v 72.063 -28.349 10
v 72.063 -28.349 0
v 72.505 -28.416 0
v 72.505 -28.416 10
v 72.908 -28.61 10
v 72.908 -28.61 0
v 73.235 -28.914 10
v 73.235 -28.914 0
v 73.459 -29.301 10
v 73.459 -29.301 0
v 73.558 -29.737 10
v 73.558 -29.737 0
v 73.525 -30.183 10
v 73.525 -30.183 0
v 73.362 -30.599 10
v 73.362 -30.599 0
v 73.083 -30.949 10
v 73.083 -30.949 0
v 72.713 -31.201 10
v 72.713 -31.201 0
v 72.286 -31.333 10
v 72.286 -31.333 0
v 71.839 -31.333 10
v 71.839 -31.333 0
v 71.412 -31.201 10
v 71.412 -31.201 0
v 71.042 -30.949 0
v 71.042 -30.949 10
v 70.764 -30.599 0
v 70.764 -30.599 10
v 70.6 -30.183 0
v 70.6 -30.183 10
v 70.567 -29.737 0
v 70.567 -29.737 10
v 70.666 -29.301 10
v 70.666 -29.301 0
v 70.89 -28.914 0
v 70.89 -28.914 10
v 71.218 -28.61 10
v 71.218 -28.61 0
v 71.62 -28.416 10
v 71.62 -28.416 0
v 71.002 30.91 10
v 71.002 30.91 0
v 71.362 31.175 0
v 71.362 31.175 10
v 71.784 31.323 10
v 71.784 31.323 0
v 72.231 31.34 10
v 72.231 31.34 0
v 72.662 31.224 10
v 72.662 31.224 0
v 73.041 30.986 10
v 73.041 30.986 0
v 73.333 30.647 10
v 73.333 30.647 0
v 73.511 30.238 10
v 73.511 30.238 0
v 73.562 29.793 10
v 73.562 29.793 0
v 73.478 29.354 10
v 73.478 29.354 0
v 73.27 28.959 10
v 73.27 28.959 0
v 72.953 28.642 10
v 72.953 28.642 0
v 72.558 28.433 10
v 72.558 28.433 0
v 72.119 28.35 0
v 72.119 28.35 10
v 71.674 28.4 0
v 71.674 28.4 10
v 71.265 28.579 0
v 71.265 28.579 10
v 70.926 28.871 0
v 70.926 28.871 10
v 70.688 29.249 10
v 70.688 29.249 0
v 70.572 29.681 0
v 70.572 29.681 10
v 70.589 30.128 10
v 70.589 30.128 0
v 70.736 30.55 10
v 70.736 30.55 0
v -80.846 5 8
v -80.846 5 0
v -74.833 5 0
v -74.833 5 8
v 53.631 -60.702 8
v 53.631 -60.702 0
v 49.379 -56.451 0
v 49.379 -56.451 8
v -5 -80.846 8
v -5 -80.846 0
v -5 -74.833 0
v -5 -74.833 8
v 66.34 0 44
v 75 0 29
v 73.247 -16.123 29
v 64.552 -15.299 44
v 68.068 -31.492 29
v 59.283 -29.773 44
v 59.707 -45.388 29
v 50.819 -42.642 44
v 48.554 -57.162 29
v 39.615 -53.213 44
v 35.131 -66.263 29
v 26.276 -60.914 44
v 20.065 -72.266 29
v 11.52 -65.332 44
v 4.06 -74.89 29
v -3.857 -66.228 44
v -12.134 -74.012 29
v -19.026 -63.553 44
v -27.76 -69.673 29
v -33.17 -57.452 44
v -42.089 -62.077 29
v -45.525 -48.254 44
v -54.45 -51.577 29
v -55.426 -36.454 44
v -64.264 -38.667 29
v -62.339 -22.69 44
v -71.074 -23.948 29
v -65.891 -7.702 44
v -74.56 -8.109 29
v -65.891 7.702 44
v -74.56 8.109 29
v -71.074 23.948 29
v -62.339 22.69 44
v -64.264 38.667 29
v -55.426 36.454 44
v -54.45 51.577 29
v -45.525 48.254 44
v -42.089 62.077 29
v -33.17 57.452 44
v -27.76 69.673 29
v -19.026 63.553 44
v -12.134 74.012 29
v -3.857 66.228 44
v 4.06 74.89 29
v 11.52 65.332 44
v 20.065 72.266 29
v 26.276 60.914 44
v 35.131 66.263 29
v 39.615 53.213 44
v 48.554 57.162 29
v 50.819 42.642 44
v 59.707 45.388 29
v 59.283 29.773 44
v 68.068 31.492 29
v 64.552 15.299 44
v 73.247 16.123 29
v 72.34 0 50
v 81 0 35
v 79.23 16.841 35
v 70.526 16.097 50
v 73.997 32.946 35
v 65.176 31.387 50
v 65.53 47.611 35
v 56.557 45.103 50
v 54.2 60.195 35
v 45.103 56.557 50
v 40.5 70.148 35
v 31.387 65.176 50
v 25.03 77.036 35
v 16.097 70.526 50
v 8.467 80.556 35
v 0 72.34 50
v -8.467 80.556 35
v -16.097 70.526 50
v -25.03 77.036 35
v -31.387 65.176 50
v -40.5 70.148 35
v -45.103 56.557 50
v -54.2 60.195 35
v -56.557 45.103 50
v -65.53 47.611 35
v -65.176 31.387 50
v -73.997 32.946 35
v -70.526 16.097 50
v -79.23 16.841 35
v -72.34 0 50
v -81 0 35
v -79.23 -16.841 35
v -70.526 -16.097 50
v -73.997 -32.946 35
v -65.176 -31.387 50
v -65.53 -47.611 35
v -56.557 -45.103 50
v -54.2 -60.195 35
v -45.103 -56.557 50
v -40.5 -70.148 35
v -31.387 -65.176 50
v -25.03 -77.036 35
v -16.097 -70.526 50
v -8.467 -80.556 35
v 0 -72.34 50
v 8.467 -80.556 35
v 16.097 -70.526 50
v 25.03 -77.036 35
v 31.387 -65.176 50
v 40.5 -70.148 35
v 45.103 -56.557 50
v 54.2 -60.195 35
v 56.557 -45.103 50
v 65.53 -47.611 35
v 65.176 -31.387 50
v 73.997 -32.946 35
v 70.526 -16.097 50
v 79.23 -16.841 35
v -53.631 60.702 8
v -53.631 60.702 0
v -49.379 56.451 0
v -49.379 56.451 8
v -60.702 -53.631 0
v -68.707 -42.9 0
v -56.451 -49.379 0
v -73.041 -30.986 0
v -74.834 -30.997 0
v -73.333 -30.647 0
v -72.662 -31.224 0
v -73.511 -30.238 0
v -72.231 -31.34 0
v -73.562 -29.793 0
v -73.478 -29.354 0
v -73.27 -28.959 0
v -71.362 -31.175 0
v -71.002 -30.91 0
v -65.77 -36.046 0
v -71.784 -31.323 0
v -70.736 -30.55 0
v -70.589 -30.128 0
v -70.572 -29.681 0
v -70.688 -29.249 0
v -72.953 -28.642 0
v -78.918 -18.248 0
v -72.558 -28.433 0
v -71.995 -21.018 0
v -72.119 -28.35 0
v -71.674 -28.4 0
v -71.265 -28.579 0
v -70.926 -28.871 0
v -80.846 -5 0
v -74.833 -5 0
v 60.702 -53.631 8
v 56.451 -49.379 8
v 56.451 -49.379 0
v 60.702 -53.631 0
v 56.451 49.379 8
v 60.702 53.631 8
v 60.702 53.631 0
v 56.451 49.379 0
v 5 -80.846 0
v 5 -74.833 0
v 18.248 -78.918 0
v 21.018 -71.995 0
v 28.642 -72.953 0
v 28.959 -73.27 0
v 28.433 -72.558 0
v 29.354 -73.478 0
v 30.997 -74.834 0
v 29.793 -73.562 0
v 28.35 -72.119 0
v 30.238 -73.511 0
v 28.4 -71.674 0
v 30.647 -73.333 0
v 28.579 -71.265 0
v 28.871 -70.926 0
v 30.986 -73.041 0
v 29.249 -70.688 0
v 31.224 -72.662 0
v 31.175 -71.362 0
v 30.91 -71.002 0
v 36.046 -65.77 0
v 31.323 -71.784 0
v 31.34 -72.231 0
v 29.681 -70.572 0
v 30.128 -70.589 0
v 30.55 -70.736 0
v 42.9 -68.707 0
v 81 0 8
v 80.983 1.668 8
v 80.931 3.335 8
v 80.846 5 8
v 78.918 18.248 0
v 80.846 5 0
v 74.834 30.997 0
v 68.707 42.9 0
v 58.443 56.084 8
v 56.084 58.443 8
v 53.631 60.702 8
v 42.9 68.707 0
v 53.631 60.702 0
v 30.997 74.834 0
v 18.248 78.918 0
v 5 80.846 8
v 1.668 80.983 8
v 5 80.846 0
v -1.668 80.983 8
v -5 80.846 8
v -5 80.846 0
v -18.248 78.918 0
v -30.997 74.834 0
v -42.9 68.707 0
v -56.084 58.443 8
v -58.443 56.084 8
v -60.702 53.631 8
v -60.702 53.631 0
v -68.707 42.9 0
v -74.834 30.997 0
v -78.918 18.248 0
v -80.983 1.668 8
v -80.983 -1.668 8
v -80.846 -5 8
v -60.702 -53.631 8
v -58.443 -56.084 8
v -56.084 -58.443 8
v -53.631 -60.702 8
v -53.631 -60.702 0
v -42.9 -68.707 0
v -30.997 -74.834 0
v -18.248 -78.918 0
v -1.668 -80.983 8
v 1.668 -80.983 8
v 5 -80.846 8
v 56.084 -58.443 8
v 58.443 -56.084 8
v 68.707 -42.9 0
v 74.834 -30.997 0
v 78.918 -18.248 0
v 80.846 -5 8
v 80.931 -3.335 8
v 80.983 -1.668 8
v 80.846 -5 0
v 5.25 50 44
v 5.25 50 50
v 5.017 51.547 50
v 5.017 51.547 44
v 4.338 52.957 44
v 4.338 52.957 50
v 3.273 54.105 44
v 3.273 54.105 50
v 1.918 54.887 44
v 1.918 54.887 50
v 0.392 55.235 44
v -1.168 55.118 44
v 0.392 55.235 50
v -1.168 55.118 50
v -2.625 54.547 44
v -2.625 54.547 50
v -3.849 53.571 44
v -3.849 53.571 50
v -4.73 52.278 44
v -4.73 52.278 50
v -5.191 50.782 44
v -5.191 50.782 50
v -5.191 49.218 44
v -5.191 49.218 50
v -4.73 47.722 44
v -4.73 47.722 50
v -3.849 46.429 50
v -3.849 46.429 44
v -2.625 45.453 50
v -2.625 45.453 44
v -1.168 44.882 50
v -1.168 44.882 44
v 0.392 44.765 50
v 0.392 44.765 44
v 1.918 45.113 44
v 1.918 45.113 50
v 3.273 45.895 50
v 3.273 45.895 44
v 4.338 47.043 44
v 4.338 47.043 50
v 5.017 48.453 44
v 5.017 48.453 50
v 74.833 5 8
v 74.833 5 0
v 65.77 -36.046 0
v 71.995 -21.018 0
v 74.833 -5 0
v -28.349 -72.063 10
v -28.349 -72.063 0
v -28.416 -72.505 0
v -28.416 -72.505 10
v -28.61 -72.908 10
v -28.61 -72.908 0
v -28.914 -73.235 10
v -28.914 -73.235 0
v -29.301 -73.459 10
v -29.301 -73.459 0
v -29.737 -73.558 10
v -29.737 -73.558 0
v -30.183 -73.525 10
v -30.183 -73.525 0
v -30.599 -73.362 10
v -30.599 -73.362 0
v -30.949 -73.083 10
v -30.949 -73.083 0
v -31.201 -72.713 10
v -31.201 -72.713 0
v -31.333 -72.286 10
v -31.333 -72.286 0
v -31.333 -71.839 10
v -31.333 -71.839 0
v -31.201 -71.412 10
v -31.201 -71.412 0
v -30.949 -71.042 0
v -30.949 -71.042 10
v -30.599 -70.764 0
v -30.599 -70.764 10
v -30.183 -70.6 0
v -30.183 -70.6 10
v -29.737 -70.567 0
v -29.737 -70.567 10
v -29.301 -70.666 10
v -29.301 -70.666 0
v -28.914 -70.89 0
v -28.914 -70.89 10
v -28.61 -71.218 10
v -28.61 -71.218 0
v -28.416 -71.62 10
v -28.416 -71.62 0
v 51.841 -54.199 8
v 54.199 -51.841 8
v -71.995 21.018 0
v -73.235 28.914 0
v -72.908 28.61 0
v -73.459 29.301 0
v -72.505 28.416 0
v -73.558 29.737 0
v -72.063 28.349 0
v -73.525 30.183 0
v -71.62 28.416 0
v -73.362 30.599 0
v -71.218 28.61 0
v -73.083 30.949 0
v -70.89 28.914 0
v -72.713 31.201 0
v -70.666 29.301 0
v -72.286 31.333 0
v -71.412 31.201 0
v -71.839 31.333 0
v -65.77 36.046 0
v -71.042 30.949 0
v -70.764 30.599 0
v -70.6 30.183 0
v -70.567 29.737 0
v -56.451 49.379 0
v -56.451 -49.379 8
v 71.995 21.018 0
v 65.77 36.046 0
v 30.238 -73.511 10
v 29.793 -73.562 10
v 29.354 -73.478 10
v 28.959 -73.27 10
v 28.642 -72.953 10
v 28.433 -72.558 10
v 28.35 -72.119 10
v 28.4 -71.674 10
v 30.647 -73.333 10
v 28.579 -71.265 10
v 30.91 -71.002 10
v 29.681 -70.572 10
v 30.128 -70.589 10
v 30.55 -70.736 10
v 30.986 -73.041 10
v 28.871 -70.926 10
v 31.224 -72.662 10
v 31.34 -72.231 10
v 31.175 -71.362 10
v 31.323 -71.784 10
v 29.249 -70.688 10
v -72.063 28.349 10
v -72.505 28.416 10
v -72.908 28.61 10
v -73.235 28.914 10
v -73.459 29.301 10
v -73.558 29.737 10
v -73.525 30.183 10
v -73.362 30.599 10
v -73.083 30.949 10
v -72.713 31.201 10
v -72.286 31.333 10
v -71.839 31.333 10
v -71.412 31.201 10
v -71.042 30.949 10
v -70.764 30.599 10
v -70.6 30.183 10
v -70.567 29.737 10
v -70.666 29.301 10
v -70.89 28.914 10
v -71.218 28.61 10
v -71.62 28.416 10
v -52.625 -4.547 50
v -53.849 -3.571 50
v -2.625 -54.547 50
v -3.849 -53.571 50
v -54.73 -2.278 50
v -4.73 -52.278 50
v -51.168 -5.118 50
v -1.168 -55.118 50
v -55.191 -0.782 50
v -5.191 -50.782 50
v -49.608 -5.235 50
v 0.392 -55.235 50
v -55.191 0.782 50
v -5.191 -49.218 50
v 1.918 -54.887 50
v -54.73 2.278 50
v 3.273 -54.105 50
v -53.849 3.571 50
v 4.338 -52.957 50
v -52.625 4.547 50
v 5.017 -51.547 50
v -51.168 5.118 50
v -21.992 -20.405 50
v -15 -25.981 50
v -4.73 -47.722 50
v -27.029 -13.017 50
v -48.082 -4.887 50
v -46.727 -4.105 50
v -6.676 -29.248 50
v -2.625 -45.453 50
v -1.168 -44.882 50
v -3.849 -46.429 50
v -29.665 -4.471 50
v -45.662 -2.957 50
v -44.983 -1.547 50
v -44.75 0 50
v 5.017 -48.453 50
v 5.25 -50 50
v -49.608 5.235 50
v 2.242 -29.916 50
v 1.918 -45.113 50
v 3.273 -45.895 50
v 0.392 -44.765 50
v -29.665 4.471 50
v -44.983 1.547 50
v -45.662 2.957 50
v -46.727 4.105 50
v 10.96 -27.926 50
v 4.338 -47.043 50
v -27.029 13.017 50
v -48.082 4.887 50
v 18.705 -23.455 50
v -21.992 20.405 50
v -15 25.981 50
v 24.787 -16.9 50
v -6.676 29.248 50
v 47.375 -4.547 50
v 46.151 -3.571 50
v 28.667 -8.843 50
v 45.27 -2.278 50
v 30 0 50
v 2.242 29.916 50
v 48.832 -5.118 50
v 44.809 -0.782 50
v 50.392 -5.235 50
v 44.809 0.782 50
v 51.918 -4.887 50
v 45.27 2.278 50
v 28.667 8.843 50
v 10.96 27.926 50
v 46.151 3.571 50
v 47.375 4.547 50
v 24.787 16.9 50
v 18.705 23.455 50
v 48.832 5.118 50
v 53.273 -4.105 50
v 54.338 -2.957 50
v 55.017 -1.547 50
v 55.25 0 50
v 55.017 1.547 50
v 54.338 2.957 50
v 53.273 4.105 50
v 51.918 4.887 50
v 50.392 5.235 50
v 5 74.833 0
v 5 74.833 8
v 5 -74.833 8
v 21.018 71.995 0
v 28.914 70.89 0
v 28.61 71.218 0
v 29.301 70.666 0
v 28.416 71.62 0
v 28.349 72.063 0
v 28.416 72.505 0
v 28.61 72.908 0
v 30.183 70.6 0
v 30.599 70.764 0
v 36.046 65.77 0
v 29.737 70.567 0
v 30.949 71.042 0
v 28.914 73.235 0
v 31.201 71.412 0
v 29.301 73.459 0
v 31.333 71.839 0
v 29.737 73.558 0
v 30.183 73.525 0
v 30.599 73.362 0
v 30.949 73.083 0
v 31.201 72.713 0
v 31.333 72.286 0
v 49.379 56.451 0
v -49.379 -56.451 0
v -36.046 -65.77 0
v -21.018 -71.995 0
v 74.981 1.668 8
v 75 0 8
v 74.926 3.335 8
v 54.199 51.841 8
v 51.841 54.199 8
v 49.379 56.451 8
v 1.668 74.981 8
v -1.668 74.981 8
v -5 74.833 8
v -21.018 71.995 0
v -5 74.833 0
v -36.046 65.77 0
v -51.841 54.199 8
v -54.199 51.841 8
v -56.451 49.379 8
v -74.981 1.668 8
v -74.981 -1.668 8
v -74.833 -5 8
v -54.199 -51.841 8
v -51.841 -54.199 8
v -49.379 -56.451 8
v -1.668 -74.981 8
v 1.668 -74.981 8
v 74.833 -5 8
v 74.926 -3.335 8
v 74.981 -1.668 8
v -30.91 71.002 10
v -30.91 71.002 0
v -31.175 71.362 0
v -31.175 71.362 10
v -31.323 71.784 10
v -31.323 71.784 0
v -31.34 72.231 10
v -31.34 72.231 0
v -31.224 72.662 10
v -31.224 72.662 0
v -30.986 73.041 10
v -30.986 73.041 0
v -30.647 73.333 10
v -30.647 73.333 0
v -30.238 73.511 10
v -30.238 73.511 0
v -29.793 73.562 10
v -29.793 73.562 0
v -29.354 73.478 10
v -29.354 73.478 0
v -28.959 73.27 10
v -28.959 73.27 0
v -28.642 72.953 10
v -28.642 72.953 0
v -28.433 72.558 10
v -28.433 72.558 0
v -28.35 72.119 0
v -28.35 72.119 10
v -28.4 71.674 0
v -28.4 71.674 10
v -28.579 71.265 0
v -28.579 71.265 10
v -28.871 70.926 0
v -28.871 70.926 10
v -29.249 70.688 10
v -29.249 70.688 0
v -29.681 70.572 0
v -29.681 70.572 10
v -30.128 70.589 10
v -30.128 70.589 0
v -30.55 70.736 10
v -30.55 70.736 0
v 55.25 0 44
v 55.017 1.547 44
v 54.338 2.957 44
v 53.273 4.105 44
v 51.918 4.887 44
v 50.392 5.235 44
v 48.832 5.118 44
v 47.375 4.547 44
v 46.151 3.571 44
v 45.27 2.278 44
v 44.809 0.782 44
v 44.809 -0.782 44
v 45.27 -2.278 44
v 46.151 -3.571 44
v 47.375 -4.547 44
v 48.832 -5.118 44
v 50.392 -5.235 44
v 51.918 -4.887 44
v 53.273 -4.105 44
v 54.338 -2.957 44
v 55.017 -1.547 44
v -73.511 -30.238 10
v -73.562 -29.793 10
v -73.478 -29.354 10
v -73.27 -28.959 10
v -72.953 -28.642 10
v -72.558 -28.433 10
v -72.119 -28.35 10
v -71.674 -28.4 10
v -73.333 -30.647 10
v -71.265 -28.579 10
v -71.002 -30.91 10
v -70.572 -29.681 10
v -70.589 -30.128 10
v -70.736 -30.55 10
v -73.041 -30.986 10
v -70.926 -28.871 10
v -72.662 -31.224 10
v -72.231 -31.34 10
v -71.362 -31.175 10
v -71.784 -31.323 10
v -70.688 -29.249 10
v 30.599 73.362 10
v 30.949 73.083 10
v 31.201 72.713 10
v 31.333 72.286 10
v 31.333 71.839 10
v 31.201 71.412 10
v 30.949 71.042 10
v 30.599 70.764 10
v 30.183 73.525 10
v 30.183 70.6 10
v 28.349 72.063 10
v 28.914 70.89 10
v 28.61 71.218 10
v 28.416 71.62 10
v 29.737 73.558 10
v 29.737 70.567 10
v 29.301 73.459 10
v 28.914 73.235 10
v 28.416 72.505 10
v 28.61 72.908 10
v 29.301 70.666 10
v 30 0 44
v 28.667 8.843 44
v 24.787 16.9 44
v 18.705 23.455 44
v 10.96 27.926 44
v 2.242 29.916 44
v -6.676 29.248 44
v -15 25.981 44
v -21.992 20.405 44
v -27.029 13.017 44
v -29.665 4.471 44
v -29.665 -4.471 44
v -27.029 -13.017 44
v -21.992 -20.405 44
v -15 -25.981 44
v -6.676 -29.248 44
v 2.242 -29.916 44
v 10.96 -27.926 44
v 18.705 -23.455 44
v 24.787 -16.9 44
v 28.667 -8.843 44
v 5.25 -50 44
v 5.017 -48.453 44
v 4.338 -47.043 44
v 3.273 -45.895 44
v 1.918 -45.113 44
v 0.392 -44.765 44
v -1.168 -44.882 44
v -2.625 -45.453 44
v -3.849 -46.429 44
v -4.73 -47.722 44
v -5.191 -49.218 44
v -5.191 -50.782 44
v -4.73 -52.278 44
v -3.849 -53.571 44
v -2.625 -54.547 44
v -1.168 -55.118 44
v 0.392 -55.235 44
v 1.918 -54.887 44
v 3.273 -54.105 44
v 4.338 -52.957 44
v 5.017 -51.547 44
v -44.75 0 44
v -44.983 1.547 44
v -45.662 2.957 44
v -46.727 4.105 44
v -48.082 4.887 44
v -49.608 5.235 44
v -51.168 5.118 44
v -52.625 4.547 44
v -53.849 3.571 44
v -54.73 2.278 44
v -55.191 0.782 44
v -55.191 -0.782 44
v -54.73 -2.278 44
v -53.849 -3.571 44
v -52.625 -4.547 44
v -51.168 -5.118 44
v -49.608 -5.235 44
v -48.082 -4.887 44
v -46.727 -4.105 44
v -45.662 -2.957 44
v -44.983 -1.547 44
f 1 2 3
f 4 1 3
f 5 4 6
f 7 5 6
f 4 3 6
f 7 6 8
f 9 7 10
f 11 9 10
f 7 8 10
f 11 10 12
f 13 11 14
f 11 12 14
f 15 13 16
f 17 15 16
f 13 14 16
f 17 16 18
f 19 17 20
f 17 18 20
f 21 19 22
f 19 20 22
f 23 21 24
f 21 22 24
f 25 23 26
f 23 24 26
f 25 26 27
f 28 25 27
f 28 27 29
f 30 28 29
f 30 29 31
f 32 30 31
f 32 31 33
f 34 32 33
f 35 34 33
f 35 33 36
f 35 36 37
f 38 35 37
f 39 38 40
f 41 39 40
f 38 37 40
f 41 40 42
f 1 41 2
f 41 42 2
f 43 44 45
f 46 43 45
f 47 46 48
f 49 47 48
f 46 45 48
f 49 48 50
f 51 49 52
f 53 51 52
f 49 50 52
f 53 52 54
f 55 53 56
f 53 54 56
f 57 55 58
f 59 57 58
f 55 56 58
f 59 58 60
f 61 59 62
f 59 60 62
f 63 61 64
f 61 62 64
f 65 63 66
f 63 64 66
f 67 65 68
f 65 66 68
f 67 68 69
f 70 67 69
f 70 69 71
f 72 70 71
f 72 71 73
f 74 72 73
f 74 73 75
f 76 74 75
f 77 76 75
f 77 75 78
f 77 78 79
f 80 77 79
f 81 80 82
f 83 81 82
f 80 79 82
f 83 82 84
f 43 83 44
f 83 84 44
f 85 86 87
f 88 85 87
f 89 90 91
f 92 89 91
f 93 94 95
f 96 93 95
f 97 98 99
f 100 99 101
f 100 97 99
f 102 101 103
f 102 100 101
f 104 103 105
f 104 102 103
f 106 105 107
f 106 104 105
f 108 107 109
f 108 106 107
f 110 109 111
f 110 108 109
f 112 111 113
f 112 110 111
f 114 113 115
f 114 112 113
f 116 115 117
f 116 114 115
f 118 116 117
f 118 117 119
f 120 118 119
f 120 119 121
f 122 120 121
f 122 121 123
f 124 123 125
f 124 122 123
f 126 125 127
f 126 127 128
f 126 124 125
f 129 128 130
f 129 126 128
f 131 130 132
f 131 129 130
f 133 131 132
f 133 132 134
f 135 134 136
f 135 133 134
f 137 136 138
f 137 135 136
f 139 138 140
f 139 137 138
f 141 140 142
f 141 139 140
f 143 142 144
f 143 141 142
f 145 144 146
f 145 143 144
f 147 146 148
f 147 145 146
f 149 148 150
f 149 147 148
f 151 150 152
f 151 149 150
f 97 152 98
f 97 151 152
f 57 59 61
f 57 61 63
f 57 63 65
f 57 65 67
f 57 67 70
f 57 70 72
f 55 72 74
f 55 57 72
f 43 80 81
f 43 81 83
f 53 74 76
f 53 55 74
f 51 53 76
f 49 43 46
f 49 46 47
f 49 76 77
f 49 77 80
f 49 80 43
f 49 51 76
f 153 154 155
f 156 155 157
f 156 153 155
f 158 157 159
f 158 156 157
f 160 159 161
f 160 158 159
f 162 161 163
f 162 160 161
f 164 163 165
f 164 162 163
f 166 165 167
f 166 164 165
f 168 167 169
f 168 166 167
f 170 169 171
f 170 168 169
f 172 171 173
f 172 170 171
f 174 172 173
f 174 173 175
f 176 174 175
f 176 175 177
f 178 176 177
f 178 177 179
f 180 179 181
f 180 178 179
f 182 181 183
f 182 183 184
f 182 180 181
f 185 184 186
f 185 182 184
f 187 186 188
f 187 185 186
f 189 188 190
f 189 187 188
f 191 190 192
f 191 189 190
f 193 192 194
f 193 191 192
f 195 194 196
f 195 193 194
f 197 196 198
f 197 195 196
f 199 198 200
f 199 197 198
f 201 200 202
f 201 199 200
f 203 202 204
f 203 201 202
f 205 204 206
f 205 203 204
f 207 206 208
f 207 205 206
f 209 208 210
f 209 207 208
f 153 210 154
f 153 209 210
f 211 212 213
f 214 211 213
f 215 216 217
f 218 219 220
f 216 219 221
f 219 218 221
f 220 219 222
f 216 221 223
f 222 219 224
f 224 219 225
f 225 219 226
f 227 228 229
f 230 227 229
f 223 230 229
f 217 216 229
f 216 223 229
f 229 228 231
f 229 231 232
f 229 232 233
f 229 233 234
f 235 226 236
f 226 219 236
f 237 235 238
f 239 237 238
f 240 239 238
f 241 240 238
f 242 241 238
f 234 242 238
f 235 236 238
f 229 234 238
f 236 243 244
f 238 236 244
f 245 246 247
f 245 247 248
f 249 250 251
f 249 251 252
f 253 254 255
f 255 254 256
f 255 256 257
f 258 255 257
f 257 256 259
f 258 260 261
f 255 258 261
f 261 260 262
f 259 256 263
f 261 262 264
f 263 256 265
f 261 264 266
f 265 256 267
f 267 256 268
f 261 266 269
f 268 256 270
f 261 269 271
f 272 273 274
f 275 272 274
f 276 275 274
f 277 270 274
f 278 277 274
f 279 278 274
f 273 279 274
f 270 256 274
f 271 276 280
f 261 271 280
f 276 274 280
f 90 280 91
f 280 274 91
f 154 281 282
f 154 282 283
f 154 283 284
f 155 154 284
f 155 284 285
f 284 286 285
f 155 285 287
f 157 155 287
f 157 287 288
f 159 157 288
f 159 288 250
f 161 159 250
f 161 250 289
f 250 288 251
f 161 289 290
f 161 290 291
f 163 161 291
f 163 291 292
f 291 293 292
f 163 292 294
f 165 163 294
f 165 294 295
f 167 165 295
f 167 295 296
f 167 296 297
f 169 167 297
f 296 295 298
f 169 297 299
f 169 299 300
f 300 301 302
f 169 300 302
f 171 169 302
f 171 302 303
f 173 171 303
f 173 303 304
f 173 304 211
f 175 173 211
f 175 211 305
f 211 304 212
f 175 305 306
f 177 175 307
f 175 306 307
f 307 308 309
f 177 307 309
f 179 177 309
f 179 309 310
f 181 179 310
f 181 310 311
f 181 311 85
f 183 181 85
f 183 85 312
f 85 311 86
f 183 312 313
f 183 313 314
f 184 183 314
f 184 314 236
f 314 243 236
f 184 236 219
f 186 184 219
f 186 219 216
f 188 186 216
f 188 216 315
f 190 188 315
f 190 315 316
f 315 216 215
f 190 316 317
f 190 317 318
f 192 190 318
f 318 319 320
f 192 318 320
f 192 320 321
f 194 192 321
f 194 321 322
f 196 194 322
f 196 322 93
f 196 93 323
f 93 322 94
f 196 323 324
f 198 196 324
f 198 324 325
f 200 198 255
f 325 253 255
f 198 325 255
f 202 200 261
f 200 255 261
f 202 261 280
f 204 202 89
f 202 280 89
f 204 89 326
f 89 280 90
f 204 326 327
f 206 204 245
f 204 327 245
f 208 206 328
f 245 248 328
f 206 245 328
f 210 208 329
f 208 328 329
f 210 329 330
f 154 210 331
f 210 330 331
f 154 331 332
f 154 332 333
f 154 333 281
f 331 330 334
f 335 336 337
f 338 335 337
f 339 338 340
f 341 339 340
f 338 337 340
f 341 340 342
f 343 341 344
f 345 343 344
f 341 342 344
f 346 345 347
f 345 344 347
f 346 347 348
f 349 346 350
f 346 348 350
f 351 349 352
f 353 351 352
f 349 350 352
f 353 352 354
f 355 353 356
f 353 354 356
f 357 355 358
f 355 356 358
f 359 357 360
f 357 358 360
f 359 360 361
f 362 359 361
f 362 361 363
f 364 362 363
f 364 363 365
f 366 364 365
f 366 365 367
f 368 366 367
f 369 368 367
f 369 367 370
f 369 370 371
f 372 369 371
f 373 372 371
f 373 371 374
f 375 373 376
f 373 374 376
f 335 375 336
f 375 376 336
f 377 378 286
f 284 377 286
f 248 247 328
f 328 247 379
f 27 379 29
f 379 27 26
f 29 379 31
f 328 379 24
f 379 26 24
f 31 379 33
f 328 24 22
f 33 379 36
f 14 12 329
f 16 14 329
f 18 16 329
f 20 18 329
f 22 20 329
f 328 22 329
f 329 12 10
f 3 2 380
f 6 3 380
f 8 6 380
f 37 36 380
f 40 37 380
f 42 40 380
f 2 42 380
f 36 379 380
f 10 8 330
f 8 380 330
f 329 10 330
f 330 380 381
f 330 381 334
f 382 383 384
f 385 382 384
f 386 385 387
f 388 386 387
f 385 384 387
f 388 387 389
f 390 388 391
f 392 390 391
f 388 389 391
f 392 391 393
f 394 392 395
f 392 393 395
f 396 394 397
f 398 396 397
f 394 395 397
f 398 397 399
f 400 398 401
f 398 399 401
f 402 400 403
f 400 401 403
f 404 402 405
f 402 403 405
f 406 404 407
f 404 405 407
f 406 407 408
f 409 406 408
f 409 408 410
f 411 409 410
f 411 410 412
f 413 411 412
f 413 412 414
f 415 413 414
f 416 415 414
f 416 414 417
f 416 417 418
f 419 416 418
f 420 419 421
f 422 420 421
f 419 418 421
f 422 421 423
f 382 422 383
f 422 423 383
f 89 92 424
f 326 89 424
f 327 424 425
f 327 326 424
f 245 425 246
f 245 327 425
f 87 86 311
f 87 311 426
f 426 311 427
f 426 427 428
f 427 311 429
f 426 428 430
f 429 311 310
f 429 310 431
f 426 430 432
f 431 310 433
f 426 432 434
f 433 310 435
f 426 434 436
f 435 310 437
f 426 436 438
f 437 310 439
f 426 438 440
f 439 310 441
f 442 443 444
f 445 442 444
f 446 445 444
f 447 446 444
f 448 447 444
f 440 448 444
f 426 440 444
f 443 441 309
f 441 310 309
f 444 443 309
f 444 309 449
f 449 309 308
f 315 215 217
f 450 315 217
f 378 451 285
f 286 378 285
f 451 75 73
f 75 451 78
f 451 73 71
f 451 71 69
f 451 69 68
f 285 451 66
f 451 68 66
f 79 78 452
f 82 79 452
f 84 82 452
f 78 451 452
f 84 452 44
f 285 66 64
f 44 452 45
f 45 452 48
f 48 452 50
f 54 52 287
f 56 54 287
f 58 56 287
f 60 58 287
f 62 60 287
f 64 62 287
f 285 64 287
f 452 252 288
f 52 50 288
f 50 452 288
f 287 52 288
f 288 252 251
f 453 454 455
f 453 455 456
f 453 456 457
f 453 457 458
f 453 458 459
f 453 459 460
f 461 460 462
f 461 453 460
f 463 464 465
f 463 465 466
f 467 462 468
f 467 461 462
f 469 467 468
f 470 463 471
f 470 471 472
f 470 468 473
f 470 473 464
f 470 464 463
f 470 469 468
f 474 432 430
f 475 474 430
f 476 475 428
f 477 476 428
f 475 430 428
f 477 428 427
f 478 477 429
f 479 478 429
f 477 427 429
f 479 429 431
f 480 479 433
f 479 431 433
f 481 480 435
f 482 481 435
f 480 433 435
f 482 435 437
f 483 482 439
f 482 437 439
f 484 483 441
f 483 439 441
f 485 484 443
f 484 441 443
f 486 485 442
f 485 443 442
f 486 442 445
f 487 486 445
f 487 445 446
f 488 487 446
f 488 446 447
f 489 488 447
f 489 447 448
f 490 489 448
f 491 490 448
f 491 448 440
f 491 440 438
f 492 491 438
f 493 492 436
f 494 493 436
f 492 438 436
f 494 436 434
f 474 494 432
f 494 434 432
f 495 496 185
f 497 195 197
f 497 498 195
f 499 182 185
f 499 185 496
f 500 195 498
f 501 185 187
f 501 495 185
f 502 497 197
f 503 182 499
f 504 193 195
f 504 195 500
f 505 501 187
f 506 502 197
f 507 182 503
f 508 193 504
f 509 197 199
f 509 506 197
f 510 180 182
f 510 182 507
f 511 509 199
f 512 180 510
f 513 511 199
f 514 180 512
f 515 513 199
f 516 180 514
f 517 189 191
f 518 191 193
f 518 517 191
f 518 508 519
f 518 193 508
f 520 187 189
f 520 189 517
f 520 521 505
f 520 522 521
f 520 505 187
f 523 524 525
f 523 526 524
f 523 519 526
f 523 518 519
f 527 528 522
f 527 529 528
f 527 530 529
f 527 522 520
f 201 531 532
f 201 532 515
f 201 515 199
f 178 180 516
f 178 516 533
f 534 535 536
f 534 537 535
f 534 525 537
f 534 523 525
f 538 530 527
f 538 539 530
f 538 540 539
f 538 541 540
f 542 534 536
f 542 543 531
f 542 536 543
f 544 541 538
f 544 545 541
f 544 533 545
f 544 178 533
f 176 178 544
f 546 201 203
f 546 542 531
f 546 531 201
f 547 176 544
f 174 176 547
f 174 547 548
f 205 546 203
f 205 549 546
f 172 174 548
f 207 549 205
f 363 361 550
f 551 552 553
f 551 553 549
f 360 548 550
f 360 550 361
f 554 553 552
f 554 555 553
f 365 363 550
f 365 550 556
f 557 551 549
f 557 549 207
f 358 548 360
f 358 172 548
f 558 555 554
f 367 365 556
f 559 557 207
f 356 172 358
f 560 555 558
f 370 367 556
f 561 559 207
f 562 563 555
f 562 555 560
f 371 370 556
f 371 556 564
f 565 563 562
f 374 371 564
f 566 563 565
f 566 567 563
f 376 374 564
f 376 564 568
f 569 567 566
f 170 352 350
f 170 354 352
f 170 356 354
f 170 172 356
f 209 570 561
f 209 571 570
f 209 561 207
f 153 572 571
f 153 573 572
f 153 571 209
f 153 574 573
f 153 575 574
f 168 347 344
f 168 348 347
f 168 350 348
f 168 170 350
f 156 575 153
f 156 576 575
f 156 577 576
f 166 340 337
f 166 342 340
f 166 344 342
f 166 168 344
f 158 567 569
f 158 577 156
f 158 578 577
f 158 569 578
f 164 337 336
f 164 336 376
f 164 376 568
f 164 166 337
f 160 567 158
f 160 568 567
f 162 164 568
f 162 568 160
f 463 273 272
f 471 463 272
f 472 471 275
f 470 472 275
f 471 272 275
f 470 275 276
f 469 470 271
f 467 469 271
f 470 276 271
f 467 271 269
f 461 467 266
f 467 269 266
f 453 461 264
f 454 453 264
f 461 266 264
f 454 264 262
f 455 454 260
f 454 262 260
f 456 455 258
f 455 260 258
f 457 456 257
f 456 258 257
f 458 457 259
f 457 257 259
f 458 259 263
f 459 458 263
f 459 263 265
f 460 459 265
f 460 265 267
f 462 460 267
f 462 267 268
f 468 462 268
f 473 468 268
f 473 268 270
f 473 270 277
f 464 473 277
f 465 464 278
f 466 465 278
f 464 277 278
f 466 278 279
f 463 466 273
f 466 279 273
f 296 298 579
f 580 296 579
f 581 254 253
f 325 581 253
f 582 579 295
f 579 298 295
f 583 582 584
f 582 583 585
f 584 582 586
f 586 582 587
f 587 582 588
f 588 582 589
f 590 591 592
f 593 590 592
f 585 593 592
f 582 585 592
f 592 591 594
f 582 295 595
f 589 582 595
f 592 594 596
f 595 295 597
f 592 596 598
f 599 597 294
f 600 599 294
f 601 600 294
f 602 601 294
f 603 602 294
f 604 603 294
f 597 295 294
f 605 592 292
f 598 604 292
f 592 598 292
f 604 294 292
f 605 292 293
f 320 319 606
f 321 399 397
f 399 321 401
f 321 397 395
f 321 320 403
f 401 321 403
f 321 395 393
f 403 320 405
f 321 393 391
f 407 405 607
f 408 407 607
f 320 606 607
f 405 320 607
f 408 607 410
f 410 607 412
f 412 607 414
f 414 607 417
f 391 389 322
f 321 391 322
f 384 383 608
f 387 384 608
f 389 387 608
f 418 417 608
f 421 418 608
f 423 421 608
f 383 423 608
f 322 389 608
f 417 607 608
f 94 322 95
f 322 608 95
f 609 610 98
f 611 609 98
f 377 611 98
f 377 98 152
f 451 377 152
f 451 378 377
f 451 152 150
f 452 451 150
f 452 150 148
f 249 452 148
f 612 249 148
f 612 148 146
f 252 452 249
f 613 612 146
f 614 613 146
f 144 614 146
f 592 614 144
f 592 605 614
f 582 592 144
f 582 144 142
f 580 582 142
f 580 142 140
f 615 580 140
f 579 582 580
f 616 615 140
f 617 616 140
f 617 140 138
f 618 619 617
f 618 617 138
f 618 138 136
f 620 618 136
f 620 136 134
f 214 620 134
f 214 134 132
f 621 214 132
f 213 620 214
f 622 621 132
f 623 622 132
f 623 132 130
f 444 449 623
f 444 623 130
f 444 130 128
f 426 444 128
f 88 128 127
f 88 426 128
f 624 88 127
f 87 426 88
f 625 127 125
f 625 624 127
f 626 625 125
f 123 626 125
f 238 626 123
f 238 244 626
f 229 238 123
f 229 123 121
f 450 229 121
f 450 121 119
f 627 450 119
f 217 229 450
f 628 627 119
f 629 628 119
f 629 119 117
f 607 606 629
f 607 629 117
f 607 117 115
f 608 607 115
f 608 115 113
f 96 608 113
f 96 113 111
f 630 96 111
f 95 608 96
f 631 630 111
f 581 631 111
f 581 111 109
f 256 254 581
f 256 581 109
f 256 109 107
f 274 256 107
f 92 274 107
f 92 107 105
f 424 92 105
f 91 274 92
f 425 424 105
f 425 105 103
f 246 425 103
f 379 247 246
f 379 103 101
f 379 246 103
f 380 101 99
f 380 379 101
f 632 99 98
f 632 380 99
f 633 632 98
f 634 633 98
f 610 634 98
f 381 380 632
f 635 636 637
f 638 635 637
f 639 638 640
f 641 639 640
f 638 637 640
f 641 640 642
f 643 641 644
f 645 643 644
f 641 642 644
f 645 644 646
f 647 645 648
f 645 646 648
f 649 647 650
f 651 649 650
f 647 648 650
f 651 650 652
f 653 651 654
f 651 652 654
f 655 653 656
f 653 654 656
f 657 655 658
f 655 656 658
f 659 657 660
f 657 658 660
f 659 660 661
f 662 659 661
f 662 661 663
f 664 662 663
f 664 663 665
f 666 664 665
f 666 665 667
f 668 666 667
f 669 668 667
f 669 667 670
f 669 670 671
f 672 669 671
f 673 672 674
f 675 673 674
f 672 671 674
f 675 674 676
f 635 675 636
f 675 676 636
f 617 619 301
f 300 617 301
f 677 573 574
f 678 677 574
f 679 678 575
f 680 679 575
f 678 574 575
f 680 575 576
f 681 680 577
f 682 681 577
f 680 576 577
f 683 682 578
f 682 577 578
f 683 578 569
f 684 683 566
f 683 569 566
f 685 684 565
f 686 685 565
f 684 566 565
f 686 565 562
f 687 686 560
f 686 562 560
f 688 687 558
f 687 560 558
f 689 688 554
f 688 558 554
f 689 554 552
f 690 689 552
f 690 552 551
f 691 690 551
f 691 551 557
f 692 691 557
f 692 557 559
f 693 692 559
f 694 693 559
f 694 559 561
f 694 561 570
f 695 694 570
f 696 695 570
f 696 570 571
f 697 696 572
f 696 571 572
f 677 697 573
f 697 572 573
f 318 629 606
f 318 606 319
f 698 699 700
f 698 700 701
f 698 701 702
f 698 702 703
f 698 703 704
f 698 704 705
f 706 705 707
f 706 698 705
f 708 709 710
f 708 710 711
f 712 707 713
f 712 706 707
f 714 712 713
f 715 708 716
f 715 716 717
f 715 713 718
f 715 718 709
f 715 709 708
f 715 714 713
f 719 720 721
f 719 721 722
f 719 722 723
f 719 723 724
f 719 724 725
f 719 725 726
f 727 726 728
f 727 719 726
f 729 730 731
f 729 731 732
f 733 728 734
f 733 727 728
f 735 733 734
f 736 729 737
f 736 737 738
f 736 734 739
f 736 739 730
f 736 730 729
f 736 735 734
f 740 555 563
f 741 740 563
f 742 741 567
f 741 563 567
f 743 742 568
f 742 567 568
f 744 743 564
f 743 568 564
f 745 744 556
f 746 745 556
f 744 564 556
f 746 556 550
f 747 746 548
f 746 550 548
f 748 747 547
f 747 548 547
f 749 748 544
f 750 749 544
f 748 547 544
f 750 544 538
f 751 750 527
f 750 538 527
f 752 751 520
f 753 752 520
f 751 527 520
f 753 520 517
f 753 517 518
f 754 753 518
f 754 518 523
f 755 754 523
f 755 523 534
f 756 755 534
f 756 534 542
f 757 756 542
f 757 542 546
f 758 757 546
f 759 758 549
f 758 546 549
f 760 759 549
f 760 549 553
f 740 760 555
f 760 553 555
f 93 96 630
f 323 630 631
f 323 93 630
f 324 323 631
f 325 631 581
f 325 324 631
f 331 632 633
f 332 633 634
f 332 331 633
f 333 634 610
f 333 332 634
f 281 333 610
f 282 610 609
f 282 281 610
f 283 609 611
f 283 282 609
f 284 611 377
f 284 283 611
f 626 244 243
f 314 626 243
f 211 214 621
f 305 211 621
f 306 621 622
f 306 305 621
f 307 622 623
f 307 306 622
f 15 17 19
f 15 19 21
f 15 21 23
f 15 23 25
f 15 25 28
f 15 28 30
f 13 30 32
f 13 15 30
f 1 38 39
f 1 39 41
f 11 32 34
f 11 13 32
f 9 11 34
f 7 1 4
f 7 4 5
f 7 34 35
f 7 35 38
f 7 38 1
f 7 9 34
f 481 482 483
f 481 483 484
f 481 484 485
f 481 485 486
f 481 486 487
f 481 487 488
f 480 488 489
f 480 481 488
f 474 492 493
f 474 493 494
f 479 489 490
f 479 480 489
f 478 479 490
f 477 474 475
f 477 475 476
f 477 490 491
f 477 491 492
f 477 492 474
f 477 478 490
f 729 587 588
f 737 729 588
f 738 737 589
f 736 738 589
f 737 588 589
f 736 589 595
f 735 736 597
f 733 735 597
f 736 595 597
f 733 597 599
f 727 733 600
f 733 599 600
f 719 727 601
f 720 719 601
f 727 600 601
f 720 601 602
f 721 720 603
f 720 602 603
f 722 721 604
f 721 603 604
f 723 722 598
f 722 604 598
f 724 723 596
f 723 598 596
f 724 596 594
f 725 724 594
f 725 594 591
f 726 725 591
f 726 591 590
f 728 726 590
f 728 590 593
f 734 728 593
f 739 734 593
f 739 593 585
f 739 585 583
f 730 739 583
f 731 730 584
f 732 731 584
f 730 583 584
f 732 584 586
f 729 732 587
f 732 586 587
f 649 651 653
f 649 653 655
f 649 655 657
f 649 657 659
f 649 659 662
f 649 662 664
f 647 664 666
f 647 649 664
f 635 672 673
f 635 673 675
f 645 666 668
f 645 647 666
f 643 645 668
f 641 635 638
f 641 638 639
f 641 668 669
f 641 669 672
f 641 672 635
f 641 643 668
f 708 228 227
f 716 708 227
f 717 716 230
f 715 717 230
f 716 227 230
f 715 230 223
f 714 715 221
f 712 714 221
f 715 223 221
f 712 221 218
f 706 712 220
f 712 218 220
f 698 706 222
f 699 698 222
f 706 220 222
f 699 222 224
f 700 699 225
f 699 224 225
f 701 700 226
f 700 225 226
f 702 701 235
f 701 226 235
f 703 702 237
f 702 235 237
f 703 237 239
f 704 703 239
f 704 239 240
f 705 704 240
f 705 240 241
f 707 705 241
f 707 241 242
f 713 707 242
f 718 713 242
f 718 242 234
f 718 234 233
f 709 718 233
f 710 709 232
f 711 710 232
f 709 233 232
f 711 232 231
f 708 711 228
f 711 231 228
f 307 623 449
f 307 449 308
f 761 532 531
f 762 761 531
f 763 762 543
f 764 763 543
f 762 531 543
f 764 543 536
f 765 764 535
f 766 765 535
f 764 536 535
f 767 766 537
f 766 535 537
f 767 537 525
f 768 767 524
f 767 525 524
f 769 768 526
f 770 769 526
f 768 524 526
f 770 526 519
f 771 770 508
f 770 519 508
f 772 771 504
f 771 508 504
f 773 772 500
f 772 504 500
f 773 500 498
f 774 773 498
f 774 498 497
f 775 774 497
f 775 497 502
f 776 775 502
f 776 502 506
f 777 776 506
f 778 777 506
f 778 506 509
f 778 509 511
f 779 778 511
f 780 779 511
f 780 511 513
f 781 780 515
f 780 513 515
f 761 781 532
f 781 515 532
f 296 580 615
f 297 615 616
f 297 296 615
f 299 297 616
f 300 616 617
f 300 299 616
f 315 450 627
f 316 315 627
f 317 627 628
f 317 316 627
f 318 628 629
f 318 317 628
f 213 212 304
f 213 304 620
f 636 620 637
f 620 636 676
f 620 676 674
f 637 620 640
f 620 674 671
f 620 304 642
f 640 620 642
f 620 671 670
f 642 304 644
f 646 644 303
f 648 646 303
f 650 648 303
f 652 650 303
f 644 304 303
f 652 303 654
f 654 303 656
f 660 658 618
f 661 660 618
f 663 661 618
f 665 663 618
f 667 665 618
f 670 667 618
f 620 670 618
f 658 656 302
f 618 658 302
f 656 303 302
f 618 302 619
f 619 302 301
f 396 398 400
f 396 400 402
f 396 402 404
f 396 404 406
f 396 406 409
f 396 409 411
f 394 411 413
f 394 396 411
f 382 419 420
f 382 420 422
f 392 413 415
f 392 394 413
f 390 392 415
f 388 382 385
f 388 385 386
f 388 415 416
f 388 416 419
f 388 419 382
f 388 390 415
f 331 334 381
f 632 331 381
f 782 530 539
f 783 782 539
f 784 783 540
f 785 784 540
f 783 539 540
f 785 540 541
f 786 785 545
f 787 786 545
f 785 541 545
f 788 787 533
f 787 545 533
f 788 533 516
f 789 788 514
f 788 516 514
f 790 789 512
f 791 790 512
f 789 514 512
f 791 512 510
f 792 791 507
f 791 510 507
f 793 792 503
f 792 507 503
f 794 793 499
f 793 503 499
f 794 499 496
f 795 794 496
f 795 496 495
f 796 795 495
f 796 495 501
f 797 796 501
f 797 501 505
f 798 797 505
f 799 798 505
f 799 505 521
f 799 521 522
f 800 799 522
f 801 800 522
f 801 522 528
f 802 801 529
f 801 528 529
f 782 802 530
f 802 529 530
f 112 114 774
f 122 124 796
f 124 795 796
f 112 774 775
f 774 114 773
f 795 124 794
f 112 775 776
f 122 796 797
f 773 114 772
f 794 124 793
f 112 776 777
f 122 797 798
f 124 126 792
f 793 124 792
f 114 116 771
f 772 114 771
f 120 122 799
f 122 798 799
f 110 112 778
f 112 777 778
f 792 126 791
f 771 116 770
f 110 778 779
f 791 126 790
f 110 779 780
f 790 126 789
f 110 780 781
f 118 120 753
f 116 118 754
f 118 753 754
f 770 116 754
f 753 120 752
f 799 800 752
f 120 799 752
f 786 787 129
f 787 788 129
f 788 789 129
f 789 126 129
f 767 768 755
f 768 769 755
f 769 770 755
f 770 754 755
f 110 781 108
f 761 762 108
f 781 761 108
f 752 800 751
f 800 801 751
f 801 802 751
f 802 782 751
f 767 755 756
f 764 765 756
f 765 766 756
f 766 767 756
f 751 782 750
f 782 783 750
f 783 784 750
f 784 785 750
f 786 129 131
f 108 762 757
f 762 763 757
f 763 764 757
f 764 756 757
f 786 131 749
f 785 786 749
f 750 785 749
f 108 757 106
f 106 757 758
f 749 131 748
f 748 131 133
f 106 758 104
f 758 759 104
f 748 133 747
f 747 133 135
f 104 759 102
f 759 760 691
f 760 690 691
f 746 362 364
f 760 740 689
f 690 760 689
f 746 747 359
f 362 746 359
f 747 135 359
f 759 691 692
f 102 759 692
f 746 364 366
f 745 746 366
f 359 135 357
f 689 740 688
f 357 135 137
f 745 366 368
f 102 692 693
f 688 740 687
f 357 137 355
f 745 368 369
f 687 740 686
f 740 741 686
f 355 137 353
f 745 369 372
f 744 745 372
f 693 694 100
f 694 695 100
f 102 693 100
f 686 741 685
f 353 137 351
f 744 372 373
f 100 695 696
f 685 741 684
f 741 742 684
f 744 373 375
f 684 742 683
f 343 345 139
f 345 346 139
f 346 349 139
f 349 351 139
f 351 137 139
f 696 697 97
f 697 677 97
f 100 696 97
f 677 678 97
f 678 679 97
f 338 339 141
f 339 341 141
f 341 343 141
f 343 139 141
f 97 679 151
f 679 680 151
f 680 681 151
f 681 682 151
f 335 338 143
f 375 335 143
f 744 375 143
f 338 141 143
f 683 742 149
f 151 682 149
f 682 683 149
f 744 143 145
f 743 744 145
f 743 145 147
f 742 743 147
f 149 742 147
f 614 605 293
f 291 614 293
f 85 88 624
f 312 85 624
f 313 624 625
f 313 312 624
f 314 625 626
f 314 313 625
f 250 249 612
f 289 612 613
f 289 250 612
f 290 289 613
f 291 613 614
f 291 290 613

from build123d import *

# Parameters (mm, degrees)
SZKIC1_R                    = 81
DODANIE_WYCI_GNI_CIE1_DEPTH = 50
SKORUPA1_T                  = -6
WYTNIJ_WYCI_GNI_CIE1_DEPTH  = 8
SZYK_KO_OWY1_COUNT          = 8
SZKIC5_R                    = 30
SZKIC5_R_2                  = 5.25
WYTNIJ_WYCI_GNI_CIE2_DEPTH  = 6
SZKIC6_R                    = 1.5
WYTNIJ_WYCI_GNI_CIE3_DEPTH  = 10
SZYK_KO_OWY2_COUNT          = 8
SFAZOWANIE1_SIZE            = 15
SFAZOWANIE1_SIZE2           = 8.660254038
SFAZOWANIE2_SIZE            = 15
SFAZOWANIE2_SIZE2           = 8.660254038


with BuildPart() as part:
    # Szkic1 → Dodanie-wyciągnięcie1 (new body)
    with BuildSketch(Plane.XY):
        Circle(SZKIC1_R)
    extrude(amount=DODANIE_WYCI_GNI_CIE1_DEPTH)

    # Skorupa1
    skorupa1_openings = [part.faces().sort_by_distance(p)[0] for p in [
        (0, 0, 0),
    ]]
    offset(amount=SKORUPA1_T, openings=skorupa1_openings, kind=Kind.INTERSECTION)

    # Szkic2 → Wytnij-wyciągnięcie1 (cut)
    with BuildSketch(Plane(origin=(0, 0, 0), x_dir=(-1, 0, 0), z_dir=(0, 0, -1))):
        with BuildLine():
            Line((5, 69.821200219), (5, 85.854528128))
            ThreePointArc((5, 85.854528128), (0, 86), (-5, 85.854528128))
            Line((-5, 85.854528128), (-5, 69.821200219))
            ThreePointArc((-5, 69.821200219), (0, 70), (5, 69.821200219))
        make_face()
    wytnij_wyci_gni_cie1 = extrude(amount=-WYTNIJ_WYCI_GNI_CIE1_DEPTH, mode=Mode.SUBTRACT)

    # Szyk kołowy1: Wytnij-wyciągnięcie1 ×8 about axis
    szyk_ko_owy1_axis = Axis((0, 0, 0), (0, 0, 1))
    for i in range(1, SZYK_KO_OWY1_COUNT):
        add(wytnij_wyci_gni_cie1.rotate(szyk_ko_owy1_axis, i * 360 / SZYK_KO_OWY1_COUNT), mode=Mode.SUBTRACT)

    # Szkic5 → Wytnij-wyciągnięcie2 (cut)
    with BuildSketch(Plane.XY.offset(50)):
        Circle(SZKIC5_R)
        with Locations((0, 50)):
            Circle(SZKIC5_R_2)
        with Locations((50, 0)):
            Circle(SZKIC5_R_2)
        with Locations((0, -50)):
            Circle(SZKIC5_R_2)
        with Locations((-50, 0)):
            Circle(SZKIC5_R_2)
    extrude(amount=-WYTNIJ_WYCI_GNI_CIE2_DEPTH, mode=Mode.SUBTRACT)

    # Szkic6 → Wytnij-wyciągnięcie3 (cut)
    with BuildSketch(Plane(origin=(0, 0, 0), x_dir=(-1, 0, 0), z_dir=(0, 0, -1))):
        with Locations((-29.849307724, 72.062603536)):
            Circle(SZKIC6_R)
    wytnij_wyci_gni_cie3 = extrude(amount=-WYTNIJ_WYCI_GNI_CIE3_DEPTH, mode=Mode.SUBTRACT)

    # Szyk kołowy2: Wytnij-wyciągnięcie3 ×8 about axis
    szyk_ko_owy2_axis = Axis((0, 0, 0), (0, 0, 1))
    for i in range(1, SZYK_KO_OWY2_COUNT):
        add(wytnij_wyci_gni_cie3.rotate(szyk_ko_owy2_axis, i * 360 / SZYK_KO_OWY2_COUNT), mode=Mode.SUBTRACT)

    # Sfazowanie1
    sfazowanie1_edges = [part.edges().sort_by_distance(p)[0] for p in [
        (-75, 0, 44),
    ]]
    sfazowanie1_side = [part.faces().sort_by_distance(p)[0] for p in [
        (-75, 0, 22),
    ]]
    chamfer(sfazowanie1_edges, length=SFAZOWANIE1_SIZE, length2=SFAZOWANIE1_SIZE2, reference=sfazowanie1_side[0])

    # Sfazowanie2
    sfazowanie2_edges = [part.edges().sort_by_distance(p)[0] for p in [
        (-81, 0, 50),
    ]]
    sfazowanie2_side = [part.faces().sort_by_distance(p)[0] for p in [
        (-81, 0, 25),
    ]]
    chamfer(sfazowanie2_edges, length=SFAZOWANIE2_SIZE, length2=SFAZOWANIE2_SIZE2, reference=sfazowanie2_side[0])


solid = part.part
